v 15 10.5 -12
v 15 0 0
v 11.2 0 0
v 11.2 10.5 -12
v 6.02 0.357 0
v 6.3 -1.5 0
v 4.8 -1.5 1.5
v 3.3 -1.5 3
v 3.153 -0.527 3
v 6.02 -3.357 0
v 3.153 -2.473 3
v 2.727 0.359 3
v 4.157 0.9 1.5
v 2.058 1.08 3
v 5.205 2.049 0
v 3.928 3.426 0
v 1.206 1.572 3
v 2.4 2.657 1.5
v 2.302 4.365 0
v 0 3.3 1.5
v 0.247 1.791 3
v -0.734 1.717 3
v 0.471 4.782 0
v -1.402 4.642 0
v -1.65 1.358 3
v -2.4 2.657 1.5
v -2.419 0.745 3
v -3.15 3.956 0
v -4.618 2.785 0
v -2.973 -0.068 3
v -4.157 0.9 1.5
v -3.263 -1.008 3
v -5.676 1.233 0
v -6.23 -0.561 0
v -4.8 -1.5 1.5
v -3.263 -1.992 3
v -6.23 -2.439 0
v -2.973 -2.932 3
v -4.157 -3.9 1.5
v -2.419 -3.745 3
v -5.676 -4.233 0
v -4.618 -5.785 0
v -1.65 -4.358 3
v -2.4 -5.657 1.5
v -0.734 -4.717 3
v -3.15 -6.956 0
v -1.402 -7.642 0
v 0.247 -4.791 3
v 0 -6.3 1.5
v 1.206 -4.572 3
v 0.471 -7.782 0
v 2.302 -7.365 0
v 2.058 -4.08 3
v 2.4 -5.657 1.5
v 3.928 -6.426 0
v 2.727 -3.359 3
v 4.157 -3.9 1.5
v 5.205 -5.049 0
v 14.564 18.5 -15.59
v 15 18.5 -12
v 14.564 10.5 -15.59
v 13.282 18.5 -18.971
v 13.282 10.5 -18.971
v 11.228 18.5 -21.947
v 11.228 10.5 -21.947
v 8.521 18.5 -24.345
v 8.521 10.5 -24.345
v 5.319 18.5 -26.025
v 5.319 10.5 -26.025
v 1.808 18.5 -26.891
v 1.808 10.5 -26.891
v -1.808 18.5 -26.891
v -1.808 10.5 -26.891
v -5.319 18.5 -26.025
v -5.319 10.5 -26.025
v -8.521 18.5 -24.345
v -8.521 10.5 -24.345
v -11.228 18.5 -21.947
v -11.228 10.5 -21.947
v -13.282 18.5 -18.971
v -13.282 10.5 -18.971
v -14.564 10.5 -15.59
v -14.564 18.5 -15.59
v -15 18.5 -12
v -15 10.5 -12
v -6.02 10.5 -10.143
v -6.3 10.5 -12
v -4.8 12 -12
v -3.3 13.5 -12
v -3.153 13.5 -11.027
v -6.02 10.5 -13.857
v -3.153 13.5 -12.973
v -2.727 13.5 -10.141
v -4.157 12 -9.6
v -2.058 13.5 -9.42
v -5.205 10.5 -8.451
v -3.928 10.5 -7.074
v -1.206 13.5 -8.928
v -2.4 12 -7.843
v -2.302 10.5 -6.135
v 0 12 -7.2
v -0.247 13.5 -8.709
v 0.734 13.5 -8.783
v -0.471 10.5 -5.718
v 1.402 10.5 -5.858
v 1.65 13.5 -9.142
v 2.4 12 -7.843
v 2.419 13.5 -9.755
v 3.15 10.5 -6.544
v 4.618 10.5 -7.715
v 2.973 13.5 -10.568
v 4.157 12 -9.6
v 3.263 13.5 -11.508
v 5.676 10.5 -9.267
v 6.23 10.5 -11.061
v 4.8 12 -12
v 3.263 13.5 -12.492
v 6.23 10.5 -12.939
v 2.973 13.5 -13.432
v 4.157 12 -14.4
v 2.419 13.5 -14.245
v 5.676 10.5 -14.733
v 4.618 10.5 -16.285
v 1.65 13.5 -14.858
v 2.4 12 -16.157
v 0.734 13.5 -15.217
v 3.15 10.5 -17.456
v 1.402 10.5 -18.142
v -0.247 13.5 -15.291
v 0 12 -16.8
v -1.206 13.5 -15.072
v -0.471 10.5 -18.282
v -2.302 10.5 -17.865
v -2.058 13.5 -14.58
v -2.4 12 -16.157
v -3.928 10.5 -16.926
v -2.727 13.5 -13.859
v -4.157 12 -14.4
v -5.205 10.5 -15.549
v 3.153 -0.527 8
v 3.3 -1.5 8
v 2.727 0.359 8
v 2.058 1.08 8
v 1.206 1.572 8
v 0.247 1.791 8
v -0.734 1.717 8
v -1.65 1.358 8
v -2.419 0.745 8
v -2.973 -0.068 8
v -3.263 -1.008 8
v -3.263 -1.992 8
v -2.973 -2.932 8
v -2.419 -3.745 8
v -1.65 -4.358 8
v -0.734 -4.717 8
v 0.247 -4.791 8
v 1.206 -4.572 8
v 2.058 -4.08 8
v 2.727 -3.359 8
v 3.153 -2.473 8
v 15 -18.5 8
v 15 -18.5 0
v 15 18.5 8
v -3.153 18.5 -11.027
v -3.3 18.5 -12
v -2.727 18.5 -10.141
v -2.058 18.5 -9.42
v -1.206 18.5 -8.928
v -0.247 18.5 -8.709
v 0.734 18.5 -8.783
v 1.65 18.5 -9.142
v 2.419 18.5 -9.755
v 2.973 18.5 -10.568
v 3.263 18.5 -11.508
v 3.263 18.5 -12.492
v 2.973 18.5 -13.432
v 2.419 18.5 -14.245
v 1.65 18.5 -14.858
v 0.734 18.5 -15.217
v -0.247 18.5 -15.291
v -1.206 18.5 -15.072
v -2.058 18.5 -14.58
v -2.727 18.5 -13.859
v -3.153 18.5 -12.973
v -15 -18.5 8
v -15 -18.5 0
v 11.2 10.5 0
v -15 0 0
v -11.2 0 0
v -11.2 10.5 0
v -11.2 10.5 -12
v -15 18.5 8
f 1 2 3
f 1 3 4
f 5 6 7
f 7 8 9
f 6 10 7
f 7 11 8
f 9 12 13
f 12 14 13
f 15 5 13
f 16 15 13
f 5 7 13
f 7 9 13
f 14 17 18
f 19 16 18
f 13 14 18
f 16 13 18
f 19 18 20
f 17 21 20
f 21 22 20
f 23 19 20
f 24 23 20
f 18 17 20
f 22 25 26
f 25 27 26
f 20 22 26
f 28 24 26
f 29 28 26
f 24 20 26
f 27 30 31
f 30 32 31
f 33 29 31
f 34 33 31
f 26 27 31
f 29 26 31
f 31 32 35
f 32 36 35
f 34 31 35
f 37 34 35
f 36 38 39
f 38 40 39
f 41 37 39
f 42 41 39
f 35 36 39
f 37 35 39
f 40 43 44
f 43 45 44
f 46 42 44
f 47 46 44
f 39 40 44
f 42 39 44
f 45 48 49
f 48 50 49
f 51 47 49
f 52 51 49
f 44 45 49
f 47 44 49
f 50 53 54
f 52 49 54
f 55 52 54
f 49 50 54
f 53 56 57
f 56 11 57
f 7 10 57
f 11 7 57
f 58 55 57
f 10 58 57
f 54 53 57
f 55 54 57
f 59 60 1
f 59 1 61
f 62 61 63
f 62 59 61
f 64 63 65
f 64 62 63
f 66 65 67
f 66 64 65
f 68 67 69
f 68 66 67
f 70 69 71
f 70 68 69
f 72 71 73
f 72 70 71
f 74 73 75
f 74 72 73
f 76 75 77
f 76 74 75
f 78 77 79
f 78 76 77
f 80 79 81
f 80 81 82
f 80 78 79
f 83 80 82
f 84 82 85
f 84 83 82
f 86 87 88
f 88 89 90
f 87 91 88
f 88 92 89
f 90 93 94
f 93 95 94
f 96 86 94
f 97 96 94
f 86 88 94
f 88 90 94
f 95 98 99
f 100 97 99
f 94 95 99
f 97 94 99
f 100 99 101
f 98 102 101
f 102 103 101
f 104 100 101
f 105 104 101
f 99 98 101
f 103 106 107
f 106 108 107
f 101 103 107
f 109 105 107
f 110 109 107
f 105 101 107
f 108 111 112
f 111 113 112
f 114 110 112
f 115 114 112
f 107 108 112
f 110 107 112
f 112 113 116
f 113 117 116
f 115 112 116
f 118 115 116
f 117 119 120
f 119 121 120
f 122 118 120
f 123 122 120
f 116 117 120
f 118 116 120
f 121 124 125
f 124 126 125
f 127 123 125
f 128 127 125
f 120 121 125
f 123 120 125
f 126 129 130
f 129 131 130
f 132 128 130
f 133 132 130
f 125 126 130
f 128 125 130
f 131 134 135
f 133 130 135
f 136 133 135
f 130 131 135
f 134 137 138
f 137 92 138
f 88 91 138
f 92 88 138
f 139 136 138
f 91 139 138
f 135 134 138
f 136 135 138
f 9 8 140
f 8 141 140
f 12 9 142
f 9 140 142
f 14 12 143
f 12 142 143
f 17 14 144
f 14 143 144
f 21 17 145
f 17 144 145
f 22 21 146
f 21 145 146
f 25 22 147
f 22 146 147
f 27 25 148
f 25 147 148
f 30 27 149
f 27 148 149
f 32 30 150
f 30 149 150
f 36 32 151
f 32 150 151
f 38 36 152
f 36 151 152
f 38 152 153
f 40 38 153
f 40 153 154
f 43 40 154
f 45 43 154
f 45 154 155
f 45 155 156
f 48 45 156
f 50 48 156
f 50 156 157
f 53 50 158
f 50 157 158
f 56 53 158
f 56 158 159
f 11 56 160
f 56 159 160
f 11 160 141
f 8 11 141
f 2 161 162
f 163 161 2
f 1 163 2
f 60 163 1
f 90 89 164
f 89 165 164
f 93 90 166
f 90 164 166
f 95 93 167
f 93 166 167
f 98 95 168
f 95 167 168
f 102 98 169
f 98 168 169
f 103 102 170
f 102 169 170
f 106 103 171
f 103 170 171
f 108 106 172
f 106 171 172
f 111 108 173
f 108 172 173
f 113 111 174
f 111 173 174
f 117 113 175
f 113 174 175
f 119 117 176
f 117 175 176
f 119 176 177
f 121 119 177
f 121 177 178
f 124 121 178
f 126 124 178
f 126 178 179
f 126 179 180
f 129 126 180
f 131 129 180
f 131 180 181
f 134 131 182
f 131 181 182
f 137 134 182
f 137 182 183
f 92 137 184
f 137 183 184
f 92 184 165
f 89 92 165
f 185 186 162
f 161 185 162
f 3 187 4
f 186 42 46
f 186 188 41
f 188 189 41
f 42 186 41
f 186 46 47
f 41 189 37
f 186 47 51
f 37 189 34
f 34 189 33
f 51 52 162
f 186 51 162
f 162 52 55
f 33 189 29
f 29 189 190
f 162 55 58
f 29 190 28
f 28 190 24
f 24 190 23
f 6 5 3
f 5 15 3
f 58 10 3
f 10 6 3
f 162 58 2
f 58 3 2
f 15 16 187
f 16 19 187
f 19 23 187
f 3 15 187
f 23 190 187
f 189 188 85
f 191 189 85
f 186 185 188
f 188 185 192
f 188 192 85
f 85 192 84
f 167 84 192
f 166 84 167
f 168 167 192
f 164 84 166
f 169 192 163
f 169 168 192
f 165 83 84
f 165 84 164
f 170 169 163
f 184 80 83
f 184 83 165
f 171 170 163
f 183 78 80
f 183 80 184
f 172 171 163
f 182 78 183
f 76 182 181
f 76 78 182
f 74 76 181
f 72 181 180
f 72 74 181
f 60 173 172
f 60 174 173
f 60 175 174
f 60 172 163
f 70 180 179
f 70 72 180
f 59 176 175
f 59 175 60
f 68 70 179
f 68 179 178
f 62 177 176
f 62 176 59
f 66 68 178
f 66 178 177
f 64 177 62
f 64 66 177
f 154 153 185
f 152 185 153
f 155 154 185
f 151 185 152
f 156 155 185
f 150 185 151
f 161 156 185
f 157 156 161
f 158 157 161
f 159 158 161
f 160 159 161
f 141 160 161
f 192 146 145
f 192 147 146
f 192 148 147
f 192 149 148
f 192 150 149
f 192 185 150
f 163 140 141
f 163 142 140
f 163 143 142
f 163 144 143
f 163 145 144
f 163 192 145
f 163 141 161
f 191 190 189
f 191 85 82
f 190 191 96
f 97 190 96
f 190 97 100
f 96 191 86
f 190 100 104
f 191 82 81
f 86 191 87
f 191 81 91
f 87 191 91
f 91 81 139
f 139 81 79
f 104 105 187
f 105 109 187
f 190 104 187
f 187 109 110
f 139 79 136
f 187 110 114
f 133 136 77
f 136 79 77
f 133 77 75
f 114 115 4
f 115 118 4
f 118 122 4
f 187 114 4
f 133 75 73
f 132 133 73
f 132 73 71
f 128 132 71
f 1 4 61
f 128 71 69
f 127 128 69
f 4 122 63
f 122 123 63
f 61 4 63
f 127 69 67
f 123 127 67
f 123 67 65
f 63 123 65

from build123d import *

# Parameters (mm, degrees)
SKETCH_1_W                   = 30
SKETCH_1_H                   = 37
EXTRUDE_1_DEPTH              = 8
EXTRUDE_2_DEPTH              = 8
EXTRUDE_3_DEPTH              = 3.8
HOLE_WIZARD_M6_1_D           = 6.6
HOLE_WIZARD_M6_1_CSINK_D     = 12.6
HOLE_WIZARD_M6_1_CSINK_ANGLE = 90
HOLE_WIZARD_M6_2_D           = 6.6
HOLE_WIZARD_M6_2_CSINK_D     = 12.6
HOLE_WIZARD_M6_2_CSINK_ANGLE = 90


with BuildPart() as part:
    # 草图1 → 凸台-拉伸1 (new body)
    with BuildSketch(Plane.XY):
        Rectangle(SKETCH_1_W, SKETCH_1_H)
    extrude(amount=EXTRUDE_1_DEPTH)

    # 草图2 → 凸台-拉伸2 (add)
    with BuildSketch(Plane(origin=(0, 18.5, 0), x_dir=(1, 0, 0), z_dir=(0, 1, 0))):
        with BuildLine():
            Line((-15, -8), (15, -8))
            Line((15, -8), (15, 12))
            ThreePointArc((15, 12), (0, 27), (-15, 12))
            Line((-15, 12), (-15, -8))
        make_face()
    extrude(amount=-EXTRUDE_2_DEPTH)

    # 草图5 → 凸台-拉伸3 (add)
    with BuildSketch(Plane(origin=(15, 0, 0), x_dir=(0, 0, -1), z_dir=(1, 0, 0))):
        Polygon((12, 10.5), (0, 10.5), (0, 0), align=None)
    extrude_3 = extrude(amount=-EXTRUDE_3_DEPTH)

    # 镜向1: 凸台-拉伸3 across plane
    add(extrude_3.mirror(Plane(origin=(0, 0, 0), x_dir=(0, 0, 1), z_dir=(1, 0, 0))))

    # M6 平锥沉头螺钉的锥形沉头孔1 (through all)
    with Locations(Plane(origin=(0, 0, 0), x_dir=(-1, 0, 0), z_dir=(0, 0, -1))):
        with Locations((0, -1.5)):
            CounterSinkHole(HOLE_WIZARD_M6_1_D / 2, HOLE_WIZARD_M6_1_CSINK_D / 2, counter_sink_angle=HOLE_WIZARD_M6_1_CSINK_ANGLE)

    # M6 平锥沉头螺钉的锥形沉头孔2 (through all)
    with Locations(Plane.XZ.offset(-10.5)):
        with Locations((0, -12)):
            CounterSinkHole(HOLE_WIZARD_M6_2_D / 2, HOLE_WIZARD_M6_2_CSINK_D / 2, counter_sink_angle=HOLE_WIZARD_M6_2_CSINK_ANGLE)


solid = part.part
